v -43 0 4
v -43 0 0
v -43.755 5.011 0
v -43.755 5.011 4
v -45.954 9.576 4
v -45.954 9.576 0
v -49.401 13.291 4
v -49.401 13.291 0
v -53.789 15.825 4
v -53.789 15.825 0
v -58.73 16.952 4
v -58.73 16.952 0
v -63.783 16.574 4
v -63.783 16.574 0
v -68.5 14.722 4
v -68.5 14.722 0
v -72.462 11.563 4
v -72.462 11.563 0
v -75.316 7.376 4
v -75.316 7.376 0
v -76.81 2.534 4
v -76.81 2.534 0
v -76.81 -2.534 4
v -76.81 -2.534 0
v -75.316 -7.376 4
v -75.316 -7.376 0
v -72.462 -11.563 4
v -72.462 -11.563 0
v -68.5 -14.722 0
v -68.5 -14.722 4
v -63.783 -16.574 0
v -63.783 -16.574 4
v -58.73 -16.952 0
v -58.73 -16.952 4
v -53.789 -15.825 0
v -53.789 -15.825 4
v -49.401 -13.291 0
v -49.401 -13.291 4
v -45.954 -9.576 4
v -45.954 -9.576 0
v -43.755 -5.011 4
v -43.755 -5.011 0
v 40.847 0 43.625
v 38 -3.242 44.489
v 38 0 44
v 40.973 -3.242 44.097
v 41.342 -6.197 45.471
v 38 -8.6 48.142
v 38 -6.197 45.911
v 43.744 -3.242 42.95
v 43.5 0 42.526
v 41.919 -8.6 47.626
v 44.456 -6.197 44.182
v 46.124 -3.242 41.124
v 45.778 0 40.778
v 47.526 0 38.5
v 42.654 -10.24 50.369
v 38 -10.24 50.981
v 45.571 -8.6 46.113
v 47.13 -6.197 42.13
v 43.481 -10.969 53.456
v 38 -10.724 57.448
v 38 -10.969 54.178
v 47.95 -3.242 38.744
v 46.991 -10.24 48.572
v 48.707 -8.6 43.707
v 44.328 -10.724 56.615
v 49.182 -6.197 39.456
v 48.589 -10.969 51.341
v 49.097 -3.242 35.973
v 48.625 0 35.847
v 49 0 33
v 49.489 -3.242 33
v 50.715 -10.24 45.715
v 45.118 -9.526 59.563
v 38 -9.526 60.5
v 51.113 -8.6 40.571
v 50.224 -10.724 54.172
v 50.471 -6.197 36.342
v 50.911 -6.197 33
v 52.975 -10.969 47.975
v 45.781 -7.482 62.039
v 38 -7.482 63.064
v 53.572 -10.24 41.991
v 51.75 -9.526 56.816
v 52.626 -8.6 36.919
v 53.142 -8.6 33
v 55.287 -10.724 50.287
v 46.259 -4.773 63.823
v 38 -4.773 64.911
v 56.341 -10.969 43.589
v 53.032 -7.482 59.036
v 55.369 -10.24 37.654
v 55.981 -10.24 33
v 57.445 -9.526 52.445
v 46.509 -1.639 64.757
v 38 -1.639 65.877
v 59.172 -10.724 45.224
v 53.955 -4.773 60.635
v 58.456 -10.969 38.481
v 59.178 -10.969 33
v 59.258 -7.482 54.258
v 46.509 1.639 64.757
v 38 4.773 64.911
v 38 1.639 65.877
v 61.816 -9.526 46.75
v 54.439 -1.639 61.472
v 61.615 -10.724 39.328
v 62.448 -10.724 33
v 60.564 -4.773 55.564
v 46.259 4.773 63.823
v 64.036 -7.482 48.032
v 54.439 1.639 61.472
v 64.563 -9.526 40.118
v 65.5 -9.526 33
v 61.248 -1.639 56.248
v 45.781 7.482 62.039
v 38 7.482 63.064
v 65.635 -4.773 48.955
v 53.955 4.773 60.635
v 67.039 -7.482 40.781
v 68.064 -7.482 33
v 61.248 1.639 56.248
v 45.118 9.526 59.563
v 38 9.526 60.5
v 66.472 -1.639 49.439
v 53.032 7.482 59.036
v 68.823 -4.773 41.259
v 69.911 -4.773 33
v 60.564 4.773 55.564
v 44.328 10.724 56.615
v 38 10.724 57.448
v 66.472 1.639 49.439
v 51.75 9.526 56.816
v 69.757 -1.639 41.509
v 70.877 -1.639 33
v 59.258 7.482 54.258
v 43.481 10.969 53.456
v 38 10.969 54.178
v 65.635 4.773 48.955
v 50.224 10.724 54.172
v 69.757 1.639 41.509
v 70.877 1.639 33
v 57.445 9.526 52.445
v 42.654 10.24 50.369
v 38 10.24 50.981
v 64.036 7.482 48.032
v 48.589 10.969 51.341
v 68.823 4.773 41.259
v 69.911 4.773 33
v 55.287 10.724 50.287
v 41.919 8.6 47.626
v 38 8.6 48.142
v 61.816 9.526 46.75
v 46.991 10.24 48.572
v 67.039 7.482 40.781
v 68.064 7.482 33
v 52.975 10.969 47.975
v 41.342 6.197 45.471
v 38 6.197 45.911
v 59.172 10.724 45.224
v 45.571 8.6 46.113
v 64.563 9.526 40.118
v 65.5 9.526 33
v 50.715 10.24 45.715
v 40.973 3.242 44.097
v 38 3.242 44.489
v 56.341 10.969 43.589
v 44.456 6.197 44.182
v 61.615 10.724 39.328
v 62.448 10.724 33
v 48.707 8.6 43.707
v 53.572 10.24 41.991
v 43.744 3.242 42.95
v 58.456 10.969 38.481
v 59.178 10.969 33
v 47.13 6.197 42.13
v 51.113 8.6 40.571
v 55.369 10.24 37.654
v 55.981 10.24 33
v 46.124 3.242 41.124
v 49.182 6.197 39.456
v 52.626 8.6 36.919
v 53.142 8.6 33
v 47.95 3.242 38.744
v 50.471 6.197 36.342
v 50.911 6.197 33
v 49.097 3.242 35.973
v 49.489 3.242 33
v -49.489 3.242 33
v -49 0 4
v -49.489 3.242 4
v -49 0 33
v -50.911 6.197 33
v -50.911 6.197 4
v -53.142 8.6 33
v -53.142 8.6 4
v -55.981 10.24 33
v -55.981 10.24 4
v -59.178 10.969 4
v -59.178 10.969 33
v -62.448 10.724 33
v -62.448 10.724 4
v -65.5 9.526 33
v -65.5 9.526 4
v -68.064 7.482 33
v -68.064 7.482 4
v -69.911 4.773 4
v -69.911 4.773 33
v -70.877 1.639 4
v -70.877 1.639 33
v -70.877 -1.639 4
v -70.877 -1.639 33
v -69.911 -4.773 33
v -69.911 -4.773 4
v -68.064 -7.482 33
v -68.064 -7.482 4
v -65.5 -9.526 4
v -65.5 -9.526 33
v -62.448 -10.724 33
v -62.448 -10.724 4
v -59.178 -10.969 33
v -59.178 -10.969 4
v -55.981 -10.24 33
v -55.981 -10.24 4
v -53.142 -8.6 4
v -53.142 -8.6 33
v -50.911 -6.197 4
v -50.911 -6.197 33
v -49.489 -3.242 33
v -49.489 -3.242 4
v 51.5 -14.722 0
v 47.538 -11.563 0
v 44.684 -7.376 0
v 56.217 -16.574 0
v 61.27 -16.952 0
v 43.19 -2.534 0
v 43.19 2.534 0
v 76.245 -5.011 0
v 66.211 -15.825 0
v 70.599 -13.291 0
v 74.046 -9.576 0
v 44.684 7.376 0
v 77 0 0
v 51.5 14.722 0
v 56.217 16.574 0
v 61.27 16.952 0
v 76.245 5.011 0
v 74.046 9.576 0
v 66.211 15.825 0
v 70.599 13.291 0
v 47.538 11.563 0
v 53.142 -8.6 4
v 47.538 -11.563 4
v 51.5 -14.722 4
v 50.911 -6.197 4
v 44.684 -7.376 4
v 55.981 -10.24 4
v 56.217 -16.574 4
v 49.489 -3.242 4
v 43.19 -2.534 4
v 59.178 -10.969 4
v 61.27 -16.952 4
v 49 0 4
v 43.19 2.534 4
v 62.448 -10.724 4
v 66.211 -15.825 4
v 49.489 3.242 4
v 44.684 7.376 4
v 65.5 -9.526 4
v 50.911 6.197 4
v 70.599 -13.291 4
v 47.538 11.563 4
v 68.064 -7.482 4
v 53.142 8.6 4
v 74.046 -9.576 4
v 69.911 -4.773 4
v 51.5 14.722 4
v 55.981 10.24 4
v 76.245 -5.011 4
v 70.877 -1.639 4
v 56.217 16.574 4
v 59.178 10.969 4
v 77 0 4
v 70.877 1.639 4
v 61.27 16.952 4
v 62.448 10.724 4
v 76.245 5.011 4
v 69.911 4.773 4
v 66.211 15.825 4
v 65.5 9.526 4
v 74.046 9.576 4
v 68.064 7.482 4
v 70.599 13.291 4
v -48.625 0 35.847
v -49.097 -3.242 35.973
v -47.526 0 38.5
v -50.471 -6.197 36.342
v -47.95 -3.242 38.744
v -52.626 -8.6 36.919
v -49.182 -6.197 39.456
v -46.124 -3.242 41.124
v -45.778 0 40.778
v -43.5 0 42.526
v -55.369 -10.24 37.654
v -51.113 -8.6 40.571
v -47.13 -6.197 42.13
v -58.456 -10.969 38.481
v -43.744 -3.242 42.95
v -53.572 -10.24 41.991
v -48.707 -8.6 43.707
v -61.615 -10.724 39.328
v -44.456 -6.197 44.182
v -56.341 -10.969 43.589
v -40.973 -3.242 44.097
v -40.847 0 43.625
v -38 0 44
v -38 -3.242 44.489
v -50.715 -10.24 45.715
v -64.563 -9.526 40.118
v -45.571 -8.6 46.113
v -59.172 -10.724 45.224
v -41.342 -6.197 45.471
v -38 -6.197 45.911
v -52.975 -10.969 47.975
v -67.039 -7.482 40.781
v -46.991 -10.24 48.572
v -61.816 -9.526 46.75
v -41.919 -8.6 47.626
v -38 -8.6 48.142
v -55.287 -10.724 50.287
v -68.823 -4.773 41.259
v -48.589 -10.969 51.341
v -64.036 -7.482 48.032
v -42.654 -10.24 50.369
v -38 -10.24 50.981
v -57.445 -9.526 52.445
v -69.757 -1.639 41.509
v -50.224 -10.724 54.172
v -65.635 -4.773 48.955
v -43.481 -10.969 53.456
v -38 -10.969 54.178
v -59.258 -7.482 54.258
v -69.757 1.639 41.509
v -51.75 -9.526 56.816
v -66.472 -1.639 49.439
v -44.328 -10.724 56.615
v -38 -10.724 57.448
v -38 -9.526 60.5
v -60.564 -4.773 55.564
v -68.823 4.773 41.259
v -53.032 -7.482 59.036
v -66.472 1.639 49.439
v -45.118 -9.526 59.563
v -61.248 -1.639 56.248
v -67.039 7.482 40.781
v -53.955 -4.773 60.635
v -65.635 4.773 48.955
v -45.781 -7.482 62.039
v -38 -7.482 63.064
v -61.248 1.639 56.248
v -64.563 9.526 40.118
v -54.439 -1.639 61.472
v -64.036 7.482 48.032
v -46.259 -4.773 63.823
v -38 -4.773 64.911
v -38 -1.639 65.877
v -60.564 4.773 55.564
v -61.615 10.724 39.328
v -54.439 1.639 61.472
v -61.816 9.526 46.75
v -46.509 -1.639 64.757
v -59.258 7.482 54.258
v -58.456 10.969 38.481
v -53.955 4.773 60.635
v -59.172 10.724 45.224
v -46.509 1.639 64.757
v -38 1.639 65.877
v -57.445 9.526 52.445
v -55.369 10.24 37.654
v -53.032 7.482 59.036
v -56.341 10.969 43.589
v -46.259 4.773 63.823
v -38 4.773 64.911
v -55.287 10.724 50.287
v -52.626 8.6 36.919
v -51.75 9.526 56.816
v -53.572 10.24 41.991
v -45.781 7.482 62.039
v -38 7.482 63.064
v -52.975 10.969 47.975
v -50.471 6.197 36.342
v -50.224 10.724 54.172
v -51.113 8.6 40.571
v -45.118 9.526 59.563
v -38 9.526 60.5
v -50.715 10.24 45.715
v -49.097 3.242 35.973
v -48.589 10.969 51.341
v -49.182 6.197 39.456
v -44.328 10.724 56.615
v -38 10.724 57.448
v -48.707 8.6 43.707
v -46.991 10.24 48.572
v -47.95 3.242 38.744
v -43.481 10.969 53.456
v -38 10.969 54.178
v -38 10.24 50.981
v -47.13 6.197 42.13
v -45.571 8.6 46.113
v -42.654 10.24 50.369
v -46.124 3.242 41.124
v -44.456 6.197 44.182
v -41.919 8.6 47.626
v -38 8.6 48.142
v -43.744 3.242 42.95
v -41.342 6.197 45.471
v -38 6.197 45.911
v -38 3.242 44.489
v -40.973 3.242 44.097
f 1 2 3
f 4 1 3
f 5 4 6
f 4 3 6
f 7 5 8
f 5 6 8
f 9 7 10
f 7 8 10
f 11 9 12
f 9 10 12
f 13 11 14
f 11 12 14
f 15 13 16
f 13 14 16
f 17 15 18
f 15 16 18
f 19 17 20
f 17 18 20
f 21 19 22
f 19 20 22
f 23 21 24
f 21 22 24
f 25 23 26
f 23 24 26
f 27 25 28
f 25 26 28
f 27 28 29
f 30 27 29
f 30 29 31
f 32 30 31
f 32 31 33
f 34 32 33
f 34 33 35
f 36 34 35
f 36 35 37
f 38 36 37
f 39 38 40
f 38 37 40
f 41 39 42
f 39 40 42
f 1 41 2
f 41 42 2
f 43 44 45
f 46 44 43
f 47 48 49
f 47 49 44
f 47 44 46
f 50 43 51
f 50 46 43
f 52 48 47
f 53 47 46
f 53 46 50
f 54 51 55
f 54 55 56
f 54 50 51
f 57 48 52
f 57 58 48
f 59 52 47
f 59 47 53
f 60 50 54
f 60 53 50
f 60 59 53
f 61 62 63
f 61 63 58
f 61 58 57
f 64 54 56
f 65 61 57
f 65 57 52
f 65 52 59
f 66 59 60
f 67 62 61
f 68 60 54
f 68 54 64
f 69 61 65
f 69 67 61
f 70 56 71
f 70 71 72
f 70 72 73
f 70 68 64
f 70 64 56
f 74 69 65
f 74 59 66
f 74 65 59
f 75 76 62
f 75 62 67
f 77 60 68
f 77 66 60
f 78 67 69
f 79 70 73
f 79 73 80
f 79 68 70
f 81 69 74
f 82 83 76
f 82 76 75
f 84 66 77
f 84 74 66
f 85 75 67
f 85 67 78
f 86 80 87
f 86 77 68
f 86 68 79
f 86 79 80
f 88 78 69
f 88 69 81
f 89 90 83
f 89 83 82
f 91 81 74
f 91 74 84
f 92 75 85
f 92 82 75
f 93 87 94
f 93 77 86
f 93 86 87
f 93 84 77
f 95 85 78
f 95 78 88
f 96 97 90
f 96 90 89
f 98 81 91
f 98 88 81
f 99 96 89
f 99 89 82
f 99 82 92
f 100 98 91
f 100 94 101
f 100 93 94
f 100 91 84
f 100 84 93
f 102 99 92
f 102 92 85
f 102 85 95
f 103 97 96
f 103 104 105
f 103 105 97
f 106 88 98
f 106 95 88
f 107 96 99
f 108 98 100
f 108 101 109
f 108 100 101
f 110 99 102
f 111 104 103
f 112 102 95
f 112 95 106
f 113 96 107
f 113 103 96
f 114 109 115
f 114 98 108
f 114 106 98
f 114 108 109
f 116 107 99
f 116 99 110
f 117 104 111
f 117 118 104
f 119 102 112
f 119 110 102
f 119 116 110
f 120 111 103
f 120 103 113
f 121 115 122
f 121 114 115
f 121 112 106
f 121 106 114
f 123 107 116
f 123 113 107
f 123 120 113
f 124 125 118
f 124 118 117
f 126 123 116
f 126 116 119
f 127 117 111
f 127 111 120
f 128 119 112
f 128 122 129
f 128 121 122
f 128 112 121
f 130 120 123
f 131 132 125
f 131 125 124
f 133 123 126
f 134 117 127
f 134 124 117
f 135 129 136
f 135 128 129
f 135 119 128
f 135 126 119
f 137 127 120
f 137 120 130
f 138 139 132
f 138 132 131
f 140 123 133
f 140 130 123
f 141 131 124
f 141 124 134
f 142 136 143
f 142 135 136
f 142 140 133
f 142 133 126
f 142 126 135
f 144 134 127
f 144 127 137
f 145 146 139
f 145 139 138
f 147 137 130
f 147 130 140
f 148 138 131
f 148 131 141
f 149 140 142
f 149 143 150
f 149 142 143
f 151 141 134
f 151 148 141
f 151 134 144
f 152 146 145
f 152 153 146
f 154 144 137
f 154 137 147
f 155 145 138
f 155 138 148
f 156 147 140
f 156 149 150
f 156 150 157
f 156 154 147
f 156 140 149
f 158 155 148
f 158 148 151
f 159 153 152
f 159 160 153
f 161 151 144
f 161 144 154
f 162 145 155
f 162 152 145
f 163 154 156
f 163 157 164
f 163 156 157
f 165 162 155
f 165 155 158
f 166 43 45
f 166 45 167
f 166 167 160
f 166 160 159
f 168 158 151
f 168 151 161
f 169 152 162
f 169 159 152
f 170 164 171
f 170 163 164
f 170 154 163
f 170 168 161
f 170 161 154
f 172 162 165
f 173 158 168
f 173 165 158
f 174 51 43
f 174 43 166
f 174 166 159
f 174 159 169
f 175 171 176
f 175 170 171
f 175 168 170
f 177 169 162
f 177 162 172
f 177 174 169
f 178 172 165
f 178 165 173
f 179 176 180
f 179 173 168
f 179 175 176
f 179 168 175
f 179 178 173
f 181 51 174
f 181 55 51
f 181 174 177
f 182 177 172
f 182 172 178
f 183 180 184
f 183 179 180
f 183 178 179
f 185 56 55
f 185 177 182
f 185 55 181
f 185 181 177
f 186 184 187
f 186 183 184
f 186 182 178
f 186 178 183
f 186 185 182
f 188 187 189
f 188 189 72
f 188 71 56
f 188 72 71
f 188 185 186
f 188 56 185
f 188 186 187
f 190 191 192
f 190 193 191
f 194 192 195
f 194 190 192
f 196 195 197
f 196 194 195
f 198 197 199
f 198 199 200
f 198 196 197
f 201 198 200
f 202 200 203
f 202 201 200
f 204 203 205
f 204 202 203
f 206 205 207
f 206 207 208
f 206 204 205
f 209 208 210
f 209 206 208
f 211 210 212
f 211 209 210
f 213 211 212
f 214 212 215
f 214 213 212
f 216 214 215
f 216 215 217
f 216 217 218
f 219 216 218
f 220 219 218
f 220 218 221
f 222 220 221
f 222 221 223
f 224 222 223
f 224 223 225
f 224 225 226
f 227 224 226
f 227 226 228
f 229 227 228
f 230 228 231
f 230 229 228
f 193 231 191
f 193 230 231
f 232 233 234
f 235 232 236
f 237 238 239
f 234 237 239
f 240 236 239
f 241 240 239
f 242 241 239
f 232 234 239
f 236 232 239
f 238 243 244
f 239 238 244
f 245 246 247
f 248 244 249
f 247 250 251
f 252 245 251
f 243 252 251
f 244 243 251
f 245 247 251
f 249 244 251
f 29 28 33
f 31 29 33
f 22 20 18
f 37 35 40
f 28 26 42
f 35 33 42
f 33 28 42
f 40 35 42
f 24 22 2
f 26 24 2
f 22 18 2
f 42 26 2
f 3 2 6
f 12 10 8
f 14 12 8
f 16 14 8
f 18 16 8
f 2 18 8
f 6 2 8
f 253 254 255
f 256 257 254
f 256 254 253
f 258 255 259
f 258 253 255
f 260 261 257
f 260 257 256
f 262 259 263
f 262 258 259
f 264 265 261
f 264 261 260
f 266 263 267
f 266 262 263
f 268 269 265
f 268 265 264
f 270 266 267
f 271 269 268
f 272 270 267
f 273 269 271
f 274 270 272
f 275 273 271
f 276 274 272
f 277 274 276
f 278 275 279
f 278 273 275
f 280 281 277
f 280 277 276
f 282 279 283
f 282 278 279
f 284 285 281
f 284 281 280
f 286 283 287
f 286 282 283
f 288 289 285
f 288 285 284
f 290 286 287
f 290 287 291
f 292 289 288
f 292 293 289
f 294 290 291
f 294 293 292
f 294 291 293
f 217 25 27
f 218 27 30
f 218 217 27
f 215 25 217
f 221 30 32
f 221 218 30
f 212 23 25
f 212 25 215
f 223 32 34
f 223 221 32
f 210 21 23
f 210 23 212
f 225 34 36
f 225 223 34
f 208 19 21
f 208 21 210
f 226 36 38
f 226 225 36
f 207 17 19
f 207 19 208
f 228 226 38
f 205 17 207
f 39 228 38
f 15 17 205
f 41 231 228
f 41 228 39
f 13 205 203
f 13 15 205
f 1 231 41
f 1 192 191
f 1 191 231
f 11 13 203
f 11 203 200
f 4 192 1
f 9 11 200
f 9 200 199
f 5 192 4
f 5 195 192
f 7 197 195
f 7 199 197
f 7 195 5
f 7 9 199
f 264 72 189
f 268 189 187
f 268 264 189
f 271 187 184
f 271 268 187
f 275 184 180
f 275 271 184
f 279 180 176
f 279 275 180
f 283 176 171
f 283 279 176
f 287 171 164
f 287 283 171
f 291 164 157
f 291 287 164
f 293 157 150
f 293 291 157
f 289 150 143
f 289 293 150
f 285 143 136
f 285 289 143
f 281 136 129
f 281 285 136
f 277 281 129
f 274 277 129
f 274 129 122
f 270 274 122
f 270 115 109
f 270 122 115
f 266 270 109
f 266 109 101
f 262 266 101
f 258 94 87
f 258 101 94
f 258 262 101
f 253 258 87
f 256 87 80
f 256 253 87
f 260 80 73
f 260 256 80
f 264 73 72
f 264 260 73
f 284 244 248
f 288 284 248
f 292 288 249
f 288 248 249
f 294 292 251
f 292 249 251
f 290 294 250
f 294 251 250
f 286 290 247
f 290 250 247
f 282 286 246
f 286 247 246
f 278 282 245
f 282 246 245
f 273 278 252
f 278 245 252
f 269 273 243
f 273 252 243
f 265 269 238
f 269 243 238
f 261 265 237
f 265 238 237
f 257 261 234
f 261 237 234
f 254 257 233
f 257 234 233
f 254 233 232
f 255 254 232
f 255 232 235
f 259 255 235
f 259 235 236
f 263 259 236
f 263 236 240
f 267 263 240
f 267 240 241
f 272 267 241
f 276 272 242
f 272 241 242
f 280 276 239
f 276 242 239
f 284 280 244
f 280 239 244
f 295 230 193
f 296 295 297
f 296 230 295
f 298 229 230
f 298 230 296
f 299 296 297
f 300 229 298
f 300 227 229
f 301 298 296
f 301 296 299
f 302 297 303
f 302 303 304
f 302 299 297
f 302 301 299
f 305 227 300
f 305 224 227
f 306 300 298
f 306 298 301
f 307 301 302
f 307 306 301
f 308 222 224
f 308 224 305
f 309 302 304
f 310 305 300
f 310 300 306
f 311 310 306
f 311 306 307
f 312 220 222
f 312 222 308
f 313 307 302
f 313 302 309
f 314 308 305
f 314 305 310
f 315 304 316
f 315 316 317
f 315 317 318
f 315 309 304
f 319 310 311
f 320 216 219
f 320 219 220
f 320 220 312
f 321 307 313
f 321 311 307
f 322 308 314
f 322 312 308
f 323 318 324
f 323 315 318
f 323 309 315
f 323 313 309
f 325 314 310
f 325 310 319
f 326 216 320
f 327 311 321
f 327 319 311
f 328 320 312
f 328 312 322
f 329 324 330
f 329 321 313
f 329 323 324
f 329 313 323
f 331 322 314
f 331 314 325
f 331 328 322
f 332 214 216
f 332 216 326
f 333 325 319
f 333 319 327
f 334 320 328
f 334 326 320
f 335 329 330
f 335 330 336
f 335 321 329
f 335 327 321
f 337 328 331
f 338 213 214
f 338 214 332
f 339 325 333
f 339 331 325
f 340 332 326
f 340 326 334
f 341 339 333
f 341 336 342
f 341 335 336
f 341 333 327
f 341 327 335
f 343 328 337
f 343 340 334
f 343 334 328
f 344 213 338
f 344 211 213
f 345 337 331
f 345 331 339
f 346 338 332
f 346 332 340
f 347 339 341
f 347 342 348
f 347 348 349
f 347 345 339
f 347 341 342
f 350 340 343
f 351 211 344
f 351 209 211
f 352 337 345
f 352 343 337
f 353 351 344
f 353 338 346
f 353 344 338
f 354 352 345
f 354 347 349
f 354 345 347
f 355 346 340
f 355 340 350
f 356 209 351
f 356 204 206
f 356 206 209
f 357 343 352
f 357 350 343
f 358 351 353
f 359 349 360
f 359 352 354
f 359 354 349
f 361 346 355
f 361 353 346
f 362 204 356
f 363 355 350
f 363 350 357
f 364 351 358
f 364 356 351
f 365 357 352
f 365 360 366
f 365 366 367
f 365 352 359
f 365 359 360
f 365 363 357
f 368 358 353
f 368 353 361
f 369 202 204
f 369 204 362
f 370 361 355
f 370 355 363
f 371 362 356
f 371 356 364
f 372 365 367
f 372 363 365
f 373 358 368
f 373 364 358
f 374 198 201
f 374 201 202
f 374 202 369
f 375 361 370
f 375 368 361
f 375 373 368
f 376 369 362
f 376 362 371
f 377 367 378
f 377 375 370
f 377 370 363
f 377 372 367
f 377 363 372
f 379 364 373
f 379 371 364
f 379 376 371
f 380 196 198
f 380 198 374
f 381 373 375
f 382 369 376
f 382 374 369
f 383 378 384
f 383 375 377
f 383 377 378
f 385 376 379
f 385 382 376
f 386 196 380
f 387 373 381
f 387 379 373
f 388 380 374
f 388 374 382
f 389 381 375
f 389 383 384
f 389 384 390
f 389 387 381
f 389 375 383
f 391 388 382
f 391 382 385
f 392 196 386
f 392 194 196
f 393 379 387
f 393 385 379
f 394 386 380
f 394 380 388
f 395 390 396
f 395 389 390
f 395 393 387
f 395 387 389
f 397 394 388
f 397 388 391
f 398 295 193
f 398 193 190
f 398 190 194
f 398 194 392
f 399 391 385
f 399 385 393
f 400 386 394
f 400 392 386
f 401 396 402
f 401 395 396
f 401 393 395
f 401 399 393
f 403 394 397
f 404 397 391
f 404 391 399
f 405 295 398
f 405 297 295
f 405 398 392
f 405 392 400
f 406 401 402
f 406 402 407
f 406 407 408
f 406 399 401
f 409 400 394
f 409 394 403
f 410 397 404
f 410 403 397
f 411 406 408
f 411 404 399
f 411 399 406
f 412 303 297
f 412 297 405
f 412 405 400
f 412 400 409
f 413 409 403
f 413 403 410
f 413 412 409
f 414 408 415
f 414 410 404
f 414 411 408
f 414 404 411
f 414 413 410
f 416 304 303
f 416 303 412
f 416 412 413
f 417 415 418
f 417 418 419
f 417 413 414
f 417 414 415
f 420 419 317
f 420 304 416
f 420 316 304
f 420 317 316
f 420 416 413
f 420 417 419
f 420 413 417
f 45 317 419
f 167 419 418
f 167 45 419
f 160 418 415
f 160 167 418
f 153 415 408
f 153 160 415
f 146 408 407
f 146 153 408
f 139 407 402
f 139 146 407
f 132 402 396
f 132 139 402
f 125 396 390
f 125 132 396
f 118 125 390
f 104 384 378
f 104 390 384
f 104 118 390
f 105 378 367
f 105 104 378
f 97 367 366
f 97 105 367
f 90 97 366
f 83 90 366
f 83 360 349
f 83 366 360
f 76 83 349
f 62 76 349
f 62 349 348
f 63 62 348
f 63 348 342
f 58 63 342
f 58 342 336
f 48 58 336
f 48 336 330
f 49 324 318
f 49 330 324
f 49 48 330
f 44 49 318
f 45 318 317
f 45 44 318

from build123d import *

# Parameters (mm, degrees)
PIPE_1_PROFILE_R   = 11
EXTRUDE_SKETCH_1_R = 17
EXTRUDE_1_DEPTH    = 4
EXTRUDE_SKETCH_2_R = 17
EXTRUDE_2_DEPTH    = 4


with BuildPart() as part:
    # Pipe 1: sweep along a curve in space
    with BuildLine() as pipe_1_path:
        Line((-60, 0, 0), (-60, 0, 33))
        ThreePointArc((-60, 0, 33), (-53.556349186, 0, 48.556349186), (-38, 0, 55))
        Line((-38, 0, 55), (38, 0, 55))
        ThreePointArc((38, 0, 55), (53.556349186, 0, 48.556349186), (60, 0, 33))
        Line((60, 0, 33), (60, 0, 0))
    # Pipe 1 profile (on start of the path) → Pipe 1 (sweep)
    with BuildSketch(Plane(origin=(-60, 0, 0), x_dir=(1, 0, 0), z_dir=(0, 0, 1))):
        Circle(PIPE_1_PROFILE_R)
    sweep(path=pipe_1_path.line)


with BuildPart() as body_2:
    # Extrude sketch 1 → Extrude 1 (new body)
    with BuildSketch(Plane.XY):
        with Locations((-60, 0)):
            Circle(EXTRUDE_SKETCH_1_R)
    extrude(amount=EXTRUDE_1_DEPTH)


with BuildPart() as body_3:
    # Extrude sketch 2 → Extrude 2 (new body)
    with BuildSketch(Plane.XY):
        with Locations((60, 0)):
            Circle(EXTRUDE_SKETCH_2_R)
    extrude(amount=EXTRUDE_2_DEPTH)


with BuildPart() as body_2_1:
    add(body_2.part)

    # Combine (weld / assembly of features): union body 3, part
    add(body_3.part)
    add(part.part)


solid = body_2_1.part
